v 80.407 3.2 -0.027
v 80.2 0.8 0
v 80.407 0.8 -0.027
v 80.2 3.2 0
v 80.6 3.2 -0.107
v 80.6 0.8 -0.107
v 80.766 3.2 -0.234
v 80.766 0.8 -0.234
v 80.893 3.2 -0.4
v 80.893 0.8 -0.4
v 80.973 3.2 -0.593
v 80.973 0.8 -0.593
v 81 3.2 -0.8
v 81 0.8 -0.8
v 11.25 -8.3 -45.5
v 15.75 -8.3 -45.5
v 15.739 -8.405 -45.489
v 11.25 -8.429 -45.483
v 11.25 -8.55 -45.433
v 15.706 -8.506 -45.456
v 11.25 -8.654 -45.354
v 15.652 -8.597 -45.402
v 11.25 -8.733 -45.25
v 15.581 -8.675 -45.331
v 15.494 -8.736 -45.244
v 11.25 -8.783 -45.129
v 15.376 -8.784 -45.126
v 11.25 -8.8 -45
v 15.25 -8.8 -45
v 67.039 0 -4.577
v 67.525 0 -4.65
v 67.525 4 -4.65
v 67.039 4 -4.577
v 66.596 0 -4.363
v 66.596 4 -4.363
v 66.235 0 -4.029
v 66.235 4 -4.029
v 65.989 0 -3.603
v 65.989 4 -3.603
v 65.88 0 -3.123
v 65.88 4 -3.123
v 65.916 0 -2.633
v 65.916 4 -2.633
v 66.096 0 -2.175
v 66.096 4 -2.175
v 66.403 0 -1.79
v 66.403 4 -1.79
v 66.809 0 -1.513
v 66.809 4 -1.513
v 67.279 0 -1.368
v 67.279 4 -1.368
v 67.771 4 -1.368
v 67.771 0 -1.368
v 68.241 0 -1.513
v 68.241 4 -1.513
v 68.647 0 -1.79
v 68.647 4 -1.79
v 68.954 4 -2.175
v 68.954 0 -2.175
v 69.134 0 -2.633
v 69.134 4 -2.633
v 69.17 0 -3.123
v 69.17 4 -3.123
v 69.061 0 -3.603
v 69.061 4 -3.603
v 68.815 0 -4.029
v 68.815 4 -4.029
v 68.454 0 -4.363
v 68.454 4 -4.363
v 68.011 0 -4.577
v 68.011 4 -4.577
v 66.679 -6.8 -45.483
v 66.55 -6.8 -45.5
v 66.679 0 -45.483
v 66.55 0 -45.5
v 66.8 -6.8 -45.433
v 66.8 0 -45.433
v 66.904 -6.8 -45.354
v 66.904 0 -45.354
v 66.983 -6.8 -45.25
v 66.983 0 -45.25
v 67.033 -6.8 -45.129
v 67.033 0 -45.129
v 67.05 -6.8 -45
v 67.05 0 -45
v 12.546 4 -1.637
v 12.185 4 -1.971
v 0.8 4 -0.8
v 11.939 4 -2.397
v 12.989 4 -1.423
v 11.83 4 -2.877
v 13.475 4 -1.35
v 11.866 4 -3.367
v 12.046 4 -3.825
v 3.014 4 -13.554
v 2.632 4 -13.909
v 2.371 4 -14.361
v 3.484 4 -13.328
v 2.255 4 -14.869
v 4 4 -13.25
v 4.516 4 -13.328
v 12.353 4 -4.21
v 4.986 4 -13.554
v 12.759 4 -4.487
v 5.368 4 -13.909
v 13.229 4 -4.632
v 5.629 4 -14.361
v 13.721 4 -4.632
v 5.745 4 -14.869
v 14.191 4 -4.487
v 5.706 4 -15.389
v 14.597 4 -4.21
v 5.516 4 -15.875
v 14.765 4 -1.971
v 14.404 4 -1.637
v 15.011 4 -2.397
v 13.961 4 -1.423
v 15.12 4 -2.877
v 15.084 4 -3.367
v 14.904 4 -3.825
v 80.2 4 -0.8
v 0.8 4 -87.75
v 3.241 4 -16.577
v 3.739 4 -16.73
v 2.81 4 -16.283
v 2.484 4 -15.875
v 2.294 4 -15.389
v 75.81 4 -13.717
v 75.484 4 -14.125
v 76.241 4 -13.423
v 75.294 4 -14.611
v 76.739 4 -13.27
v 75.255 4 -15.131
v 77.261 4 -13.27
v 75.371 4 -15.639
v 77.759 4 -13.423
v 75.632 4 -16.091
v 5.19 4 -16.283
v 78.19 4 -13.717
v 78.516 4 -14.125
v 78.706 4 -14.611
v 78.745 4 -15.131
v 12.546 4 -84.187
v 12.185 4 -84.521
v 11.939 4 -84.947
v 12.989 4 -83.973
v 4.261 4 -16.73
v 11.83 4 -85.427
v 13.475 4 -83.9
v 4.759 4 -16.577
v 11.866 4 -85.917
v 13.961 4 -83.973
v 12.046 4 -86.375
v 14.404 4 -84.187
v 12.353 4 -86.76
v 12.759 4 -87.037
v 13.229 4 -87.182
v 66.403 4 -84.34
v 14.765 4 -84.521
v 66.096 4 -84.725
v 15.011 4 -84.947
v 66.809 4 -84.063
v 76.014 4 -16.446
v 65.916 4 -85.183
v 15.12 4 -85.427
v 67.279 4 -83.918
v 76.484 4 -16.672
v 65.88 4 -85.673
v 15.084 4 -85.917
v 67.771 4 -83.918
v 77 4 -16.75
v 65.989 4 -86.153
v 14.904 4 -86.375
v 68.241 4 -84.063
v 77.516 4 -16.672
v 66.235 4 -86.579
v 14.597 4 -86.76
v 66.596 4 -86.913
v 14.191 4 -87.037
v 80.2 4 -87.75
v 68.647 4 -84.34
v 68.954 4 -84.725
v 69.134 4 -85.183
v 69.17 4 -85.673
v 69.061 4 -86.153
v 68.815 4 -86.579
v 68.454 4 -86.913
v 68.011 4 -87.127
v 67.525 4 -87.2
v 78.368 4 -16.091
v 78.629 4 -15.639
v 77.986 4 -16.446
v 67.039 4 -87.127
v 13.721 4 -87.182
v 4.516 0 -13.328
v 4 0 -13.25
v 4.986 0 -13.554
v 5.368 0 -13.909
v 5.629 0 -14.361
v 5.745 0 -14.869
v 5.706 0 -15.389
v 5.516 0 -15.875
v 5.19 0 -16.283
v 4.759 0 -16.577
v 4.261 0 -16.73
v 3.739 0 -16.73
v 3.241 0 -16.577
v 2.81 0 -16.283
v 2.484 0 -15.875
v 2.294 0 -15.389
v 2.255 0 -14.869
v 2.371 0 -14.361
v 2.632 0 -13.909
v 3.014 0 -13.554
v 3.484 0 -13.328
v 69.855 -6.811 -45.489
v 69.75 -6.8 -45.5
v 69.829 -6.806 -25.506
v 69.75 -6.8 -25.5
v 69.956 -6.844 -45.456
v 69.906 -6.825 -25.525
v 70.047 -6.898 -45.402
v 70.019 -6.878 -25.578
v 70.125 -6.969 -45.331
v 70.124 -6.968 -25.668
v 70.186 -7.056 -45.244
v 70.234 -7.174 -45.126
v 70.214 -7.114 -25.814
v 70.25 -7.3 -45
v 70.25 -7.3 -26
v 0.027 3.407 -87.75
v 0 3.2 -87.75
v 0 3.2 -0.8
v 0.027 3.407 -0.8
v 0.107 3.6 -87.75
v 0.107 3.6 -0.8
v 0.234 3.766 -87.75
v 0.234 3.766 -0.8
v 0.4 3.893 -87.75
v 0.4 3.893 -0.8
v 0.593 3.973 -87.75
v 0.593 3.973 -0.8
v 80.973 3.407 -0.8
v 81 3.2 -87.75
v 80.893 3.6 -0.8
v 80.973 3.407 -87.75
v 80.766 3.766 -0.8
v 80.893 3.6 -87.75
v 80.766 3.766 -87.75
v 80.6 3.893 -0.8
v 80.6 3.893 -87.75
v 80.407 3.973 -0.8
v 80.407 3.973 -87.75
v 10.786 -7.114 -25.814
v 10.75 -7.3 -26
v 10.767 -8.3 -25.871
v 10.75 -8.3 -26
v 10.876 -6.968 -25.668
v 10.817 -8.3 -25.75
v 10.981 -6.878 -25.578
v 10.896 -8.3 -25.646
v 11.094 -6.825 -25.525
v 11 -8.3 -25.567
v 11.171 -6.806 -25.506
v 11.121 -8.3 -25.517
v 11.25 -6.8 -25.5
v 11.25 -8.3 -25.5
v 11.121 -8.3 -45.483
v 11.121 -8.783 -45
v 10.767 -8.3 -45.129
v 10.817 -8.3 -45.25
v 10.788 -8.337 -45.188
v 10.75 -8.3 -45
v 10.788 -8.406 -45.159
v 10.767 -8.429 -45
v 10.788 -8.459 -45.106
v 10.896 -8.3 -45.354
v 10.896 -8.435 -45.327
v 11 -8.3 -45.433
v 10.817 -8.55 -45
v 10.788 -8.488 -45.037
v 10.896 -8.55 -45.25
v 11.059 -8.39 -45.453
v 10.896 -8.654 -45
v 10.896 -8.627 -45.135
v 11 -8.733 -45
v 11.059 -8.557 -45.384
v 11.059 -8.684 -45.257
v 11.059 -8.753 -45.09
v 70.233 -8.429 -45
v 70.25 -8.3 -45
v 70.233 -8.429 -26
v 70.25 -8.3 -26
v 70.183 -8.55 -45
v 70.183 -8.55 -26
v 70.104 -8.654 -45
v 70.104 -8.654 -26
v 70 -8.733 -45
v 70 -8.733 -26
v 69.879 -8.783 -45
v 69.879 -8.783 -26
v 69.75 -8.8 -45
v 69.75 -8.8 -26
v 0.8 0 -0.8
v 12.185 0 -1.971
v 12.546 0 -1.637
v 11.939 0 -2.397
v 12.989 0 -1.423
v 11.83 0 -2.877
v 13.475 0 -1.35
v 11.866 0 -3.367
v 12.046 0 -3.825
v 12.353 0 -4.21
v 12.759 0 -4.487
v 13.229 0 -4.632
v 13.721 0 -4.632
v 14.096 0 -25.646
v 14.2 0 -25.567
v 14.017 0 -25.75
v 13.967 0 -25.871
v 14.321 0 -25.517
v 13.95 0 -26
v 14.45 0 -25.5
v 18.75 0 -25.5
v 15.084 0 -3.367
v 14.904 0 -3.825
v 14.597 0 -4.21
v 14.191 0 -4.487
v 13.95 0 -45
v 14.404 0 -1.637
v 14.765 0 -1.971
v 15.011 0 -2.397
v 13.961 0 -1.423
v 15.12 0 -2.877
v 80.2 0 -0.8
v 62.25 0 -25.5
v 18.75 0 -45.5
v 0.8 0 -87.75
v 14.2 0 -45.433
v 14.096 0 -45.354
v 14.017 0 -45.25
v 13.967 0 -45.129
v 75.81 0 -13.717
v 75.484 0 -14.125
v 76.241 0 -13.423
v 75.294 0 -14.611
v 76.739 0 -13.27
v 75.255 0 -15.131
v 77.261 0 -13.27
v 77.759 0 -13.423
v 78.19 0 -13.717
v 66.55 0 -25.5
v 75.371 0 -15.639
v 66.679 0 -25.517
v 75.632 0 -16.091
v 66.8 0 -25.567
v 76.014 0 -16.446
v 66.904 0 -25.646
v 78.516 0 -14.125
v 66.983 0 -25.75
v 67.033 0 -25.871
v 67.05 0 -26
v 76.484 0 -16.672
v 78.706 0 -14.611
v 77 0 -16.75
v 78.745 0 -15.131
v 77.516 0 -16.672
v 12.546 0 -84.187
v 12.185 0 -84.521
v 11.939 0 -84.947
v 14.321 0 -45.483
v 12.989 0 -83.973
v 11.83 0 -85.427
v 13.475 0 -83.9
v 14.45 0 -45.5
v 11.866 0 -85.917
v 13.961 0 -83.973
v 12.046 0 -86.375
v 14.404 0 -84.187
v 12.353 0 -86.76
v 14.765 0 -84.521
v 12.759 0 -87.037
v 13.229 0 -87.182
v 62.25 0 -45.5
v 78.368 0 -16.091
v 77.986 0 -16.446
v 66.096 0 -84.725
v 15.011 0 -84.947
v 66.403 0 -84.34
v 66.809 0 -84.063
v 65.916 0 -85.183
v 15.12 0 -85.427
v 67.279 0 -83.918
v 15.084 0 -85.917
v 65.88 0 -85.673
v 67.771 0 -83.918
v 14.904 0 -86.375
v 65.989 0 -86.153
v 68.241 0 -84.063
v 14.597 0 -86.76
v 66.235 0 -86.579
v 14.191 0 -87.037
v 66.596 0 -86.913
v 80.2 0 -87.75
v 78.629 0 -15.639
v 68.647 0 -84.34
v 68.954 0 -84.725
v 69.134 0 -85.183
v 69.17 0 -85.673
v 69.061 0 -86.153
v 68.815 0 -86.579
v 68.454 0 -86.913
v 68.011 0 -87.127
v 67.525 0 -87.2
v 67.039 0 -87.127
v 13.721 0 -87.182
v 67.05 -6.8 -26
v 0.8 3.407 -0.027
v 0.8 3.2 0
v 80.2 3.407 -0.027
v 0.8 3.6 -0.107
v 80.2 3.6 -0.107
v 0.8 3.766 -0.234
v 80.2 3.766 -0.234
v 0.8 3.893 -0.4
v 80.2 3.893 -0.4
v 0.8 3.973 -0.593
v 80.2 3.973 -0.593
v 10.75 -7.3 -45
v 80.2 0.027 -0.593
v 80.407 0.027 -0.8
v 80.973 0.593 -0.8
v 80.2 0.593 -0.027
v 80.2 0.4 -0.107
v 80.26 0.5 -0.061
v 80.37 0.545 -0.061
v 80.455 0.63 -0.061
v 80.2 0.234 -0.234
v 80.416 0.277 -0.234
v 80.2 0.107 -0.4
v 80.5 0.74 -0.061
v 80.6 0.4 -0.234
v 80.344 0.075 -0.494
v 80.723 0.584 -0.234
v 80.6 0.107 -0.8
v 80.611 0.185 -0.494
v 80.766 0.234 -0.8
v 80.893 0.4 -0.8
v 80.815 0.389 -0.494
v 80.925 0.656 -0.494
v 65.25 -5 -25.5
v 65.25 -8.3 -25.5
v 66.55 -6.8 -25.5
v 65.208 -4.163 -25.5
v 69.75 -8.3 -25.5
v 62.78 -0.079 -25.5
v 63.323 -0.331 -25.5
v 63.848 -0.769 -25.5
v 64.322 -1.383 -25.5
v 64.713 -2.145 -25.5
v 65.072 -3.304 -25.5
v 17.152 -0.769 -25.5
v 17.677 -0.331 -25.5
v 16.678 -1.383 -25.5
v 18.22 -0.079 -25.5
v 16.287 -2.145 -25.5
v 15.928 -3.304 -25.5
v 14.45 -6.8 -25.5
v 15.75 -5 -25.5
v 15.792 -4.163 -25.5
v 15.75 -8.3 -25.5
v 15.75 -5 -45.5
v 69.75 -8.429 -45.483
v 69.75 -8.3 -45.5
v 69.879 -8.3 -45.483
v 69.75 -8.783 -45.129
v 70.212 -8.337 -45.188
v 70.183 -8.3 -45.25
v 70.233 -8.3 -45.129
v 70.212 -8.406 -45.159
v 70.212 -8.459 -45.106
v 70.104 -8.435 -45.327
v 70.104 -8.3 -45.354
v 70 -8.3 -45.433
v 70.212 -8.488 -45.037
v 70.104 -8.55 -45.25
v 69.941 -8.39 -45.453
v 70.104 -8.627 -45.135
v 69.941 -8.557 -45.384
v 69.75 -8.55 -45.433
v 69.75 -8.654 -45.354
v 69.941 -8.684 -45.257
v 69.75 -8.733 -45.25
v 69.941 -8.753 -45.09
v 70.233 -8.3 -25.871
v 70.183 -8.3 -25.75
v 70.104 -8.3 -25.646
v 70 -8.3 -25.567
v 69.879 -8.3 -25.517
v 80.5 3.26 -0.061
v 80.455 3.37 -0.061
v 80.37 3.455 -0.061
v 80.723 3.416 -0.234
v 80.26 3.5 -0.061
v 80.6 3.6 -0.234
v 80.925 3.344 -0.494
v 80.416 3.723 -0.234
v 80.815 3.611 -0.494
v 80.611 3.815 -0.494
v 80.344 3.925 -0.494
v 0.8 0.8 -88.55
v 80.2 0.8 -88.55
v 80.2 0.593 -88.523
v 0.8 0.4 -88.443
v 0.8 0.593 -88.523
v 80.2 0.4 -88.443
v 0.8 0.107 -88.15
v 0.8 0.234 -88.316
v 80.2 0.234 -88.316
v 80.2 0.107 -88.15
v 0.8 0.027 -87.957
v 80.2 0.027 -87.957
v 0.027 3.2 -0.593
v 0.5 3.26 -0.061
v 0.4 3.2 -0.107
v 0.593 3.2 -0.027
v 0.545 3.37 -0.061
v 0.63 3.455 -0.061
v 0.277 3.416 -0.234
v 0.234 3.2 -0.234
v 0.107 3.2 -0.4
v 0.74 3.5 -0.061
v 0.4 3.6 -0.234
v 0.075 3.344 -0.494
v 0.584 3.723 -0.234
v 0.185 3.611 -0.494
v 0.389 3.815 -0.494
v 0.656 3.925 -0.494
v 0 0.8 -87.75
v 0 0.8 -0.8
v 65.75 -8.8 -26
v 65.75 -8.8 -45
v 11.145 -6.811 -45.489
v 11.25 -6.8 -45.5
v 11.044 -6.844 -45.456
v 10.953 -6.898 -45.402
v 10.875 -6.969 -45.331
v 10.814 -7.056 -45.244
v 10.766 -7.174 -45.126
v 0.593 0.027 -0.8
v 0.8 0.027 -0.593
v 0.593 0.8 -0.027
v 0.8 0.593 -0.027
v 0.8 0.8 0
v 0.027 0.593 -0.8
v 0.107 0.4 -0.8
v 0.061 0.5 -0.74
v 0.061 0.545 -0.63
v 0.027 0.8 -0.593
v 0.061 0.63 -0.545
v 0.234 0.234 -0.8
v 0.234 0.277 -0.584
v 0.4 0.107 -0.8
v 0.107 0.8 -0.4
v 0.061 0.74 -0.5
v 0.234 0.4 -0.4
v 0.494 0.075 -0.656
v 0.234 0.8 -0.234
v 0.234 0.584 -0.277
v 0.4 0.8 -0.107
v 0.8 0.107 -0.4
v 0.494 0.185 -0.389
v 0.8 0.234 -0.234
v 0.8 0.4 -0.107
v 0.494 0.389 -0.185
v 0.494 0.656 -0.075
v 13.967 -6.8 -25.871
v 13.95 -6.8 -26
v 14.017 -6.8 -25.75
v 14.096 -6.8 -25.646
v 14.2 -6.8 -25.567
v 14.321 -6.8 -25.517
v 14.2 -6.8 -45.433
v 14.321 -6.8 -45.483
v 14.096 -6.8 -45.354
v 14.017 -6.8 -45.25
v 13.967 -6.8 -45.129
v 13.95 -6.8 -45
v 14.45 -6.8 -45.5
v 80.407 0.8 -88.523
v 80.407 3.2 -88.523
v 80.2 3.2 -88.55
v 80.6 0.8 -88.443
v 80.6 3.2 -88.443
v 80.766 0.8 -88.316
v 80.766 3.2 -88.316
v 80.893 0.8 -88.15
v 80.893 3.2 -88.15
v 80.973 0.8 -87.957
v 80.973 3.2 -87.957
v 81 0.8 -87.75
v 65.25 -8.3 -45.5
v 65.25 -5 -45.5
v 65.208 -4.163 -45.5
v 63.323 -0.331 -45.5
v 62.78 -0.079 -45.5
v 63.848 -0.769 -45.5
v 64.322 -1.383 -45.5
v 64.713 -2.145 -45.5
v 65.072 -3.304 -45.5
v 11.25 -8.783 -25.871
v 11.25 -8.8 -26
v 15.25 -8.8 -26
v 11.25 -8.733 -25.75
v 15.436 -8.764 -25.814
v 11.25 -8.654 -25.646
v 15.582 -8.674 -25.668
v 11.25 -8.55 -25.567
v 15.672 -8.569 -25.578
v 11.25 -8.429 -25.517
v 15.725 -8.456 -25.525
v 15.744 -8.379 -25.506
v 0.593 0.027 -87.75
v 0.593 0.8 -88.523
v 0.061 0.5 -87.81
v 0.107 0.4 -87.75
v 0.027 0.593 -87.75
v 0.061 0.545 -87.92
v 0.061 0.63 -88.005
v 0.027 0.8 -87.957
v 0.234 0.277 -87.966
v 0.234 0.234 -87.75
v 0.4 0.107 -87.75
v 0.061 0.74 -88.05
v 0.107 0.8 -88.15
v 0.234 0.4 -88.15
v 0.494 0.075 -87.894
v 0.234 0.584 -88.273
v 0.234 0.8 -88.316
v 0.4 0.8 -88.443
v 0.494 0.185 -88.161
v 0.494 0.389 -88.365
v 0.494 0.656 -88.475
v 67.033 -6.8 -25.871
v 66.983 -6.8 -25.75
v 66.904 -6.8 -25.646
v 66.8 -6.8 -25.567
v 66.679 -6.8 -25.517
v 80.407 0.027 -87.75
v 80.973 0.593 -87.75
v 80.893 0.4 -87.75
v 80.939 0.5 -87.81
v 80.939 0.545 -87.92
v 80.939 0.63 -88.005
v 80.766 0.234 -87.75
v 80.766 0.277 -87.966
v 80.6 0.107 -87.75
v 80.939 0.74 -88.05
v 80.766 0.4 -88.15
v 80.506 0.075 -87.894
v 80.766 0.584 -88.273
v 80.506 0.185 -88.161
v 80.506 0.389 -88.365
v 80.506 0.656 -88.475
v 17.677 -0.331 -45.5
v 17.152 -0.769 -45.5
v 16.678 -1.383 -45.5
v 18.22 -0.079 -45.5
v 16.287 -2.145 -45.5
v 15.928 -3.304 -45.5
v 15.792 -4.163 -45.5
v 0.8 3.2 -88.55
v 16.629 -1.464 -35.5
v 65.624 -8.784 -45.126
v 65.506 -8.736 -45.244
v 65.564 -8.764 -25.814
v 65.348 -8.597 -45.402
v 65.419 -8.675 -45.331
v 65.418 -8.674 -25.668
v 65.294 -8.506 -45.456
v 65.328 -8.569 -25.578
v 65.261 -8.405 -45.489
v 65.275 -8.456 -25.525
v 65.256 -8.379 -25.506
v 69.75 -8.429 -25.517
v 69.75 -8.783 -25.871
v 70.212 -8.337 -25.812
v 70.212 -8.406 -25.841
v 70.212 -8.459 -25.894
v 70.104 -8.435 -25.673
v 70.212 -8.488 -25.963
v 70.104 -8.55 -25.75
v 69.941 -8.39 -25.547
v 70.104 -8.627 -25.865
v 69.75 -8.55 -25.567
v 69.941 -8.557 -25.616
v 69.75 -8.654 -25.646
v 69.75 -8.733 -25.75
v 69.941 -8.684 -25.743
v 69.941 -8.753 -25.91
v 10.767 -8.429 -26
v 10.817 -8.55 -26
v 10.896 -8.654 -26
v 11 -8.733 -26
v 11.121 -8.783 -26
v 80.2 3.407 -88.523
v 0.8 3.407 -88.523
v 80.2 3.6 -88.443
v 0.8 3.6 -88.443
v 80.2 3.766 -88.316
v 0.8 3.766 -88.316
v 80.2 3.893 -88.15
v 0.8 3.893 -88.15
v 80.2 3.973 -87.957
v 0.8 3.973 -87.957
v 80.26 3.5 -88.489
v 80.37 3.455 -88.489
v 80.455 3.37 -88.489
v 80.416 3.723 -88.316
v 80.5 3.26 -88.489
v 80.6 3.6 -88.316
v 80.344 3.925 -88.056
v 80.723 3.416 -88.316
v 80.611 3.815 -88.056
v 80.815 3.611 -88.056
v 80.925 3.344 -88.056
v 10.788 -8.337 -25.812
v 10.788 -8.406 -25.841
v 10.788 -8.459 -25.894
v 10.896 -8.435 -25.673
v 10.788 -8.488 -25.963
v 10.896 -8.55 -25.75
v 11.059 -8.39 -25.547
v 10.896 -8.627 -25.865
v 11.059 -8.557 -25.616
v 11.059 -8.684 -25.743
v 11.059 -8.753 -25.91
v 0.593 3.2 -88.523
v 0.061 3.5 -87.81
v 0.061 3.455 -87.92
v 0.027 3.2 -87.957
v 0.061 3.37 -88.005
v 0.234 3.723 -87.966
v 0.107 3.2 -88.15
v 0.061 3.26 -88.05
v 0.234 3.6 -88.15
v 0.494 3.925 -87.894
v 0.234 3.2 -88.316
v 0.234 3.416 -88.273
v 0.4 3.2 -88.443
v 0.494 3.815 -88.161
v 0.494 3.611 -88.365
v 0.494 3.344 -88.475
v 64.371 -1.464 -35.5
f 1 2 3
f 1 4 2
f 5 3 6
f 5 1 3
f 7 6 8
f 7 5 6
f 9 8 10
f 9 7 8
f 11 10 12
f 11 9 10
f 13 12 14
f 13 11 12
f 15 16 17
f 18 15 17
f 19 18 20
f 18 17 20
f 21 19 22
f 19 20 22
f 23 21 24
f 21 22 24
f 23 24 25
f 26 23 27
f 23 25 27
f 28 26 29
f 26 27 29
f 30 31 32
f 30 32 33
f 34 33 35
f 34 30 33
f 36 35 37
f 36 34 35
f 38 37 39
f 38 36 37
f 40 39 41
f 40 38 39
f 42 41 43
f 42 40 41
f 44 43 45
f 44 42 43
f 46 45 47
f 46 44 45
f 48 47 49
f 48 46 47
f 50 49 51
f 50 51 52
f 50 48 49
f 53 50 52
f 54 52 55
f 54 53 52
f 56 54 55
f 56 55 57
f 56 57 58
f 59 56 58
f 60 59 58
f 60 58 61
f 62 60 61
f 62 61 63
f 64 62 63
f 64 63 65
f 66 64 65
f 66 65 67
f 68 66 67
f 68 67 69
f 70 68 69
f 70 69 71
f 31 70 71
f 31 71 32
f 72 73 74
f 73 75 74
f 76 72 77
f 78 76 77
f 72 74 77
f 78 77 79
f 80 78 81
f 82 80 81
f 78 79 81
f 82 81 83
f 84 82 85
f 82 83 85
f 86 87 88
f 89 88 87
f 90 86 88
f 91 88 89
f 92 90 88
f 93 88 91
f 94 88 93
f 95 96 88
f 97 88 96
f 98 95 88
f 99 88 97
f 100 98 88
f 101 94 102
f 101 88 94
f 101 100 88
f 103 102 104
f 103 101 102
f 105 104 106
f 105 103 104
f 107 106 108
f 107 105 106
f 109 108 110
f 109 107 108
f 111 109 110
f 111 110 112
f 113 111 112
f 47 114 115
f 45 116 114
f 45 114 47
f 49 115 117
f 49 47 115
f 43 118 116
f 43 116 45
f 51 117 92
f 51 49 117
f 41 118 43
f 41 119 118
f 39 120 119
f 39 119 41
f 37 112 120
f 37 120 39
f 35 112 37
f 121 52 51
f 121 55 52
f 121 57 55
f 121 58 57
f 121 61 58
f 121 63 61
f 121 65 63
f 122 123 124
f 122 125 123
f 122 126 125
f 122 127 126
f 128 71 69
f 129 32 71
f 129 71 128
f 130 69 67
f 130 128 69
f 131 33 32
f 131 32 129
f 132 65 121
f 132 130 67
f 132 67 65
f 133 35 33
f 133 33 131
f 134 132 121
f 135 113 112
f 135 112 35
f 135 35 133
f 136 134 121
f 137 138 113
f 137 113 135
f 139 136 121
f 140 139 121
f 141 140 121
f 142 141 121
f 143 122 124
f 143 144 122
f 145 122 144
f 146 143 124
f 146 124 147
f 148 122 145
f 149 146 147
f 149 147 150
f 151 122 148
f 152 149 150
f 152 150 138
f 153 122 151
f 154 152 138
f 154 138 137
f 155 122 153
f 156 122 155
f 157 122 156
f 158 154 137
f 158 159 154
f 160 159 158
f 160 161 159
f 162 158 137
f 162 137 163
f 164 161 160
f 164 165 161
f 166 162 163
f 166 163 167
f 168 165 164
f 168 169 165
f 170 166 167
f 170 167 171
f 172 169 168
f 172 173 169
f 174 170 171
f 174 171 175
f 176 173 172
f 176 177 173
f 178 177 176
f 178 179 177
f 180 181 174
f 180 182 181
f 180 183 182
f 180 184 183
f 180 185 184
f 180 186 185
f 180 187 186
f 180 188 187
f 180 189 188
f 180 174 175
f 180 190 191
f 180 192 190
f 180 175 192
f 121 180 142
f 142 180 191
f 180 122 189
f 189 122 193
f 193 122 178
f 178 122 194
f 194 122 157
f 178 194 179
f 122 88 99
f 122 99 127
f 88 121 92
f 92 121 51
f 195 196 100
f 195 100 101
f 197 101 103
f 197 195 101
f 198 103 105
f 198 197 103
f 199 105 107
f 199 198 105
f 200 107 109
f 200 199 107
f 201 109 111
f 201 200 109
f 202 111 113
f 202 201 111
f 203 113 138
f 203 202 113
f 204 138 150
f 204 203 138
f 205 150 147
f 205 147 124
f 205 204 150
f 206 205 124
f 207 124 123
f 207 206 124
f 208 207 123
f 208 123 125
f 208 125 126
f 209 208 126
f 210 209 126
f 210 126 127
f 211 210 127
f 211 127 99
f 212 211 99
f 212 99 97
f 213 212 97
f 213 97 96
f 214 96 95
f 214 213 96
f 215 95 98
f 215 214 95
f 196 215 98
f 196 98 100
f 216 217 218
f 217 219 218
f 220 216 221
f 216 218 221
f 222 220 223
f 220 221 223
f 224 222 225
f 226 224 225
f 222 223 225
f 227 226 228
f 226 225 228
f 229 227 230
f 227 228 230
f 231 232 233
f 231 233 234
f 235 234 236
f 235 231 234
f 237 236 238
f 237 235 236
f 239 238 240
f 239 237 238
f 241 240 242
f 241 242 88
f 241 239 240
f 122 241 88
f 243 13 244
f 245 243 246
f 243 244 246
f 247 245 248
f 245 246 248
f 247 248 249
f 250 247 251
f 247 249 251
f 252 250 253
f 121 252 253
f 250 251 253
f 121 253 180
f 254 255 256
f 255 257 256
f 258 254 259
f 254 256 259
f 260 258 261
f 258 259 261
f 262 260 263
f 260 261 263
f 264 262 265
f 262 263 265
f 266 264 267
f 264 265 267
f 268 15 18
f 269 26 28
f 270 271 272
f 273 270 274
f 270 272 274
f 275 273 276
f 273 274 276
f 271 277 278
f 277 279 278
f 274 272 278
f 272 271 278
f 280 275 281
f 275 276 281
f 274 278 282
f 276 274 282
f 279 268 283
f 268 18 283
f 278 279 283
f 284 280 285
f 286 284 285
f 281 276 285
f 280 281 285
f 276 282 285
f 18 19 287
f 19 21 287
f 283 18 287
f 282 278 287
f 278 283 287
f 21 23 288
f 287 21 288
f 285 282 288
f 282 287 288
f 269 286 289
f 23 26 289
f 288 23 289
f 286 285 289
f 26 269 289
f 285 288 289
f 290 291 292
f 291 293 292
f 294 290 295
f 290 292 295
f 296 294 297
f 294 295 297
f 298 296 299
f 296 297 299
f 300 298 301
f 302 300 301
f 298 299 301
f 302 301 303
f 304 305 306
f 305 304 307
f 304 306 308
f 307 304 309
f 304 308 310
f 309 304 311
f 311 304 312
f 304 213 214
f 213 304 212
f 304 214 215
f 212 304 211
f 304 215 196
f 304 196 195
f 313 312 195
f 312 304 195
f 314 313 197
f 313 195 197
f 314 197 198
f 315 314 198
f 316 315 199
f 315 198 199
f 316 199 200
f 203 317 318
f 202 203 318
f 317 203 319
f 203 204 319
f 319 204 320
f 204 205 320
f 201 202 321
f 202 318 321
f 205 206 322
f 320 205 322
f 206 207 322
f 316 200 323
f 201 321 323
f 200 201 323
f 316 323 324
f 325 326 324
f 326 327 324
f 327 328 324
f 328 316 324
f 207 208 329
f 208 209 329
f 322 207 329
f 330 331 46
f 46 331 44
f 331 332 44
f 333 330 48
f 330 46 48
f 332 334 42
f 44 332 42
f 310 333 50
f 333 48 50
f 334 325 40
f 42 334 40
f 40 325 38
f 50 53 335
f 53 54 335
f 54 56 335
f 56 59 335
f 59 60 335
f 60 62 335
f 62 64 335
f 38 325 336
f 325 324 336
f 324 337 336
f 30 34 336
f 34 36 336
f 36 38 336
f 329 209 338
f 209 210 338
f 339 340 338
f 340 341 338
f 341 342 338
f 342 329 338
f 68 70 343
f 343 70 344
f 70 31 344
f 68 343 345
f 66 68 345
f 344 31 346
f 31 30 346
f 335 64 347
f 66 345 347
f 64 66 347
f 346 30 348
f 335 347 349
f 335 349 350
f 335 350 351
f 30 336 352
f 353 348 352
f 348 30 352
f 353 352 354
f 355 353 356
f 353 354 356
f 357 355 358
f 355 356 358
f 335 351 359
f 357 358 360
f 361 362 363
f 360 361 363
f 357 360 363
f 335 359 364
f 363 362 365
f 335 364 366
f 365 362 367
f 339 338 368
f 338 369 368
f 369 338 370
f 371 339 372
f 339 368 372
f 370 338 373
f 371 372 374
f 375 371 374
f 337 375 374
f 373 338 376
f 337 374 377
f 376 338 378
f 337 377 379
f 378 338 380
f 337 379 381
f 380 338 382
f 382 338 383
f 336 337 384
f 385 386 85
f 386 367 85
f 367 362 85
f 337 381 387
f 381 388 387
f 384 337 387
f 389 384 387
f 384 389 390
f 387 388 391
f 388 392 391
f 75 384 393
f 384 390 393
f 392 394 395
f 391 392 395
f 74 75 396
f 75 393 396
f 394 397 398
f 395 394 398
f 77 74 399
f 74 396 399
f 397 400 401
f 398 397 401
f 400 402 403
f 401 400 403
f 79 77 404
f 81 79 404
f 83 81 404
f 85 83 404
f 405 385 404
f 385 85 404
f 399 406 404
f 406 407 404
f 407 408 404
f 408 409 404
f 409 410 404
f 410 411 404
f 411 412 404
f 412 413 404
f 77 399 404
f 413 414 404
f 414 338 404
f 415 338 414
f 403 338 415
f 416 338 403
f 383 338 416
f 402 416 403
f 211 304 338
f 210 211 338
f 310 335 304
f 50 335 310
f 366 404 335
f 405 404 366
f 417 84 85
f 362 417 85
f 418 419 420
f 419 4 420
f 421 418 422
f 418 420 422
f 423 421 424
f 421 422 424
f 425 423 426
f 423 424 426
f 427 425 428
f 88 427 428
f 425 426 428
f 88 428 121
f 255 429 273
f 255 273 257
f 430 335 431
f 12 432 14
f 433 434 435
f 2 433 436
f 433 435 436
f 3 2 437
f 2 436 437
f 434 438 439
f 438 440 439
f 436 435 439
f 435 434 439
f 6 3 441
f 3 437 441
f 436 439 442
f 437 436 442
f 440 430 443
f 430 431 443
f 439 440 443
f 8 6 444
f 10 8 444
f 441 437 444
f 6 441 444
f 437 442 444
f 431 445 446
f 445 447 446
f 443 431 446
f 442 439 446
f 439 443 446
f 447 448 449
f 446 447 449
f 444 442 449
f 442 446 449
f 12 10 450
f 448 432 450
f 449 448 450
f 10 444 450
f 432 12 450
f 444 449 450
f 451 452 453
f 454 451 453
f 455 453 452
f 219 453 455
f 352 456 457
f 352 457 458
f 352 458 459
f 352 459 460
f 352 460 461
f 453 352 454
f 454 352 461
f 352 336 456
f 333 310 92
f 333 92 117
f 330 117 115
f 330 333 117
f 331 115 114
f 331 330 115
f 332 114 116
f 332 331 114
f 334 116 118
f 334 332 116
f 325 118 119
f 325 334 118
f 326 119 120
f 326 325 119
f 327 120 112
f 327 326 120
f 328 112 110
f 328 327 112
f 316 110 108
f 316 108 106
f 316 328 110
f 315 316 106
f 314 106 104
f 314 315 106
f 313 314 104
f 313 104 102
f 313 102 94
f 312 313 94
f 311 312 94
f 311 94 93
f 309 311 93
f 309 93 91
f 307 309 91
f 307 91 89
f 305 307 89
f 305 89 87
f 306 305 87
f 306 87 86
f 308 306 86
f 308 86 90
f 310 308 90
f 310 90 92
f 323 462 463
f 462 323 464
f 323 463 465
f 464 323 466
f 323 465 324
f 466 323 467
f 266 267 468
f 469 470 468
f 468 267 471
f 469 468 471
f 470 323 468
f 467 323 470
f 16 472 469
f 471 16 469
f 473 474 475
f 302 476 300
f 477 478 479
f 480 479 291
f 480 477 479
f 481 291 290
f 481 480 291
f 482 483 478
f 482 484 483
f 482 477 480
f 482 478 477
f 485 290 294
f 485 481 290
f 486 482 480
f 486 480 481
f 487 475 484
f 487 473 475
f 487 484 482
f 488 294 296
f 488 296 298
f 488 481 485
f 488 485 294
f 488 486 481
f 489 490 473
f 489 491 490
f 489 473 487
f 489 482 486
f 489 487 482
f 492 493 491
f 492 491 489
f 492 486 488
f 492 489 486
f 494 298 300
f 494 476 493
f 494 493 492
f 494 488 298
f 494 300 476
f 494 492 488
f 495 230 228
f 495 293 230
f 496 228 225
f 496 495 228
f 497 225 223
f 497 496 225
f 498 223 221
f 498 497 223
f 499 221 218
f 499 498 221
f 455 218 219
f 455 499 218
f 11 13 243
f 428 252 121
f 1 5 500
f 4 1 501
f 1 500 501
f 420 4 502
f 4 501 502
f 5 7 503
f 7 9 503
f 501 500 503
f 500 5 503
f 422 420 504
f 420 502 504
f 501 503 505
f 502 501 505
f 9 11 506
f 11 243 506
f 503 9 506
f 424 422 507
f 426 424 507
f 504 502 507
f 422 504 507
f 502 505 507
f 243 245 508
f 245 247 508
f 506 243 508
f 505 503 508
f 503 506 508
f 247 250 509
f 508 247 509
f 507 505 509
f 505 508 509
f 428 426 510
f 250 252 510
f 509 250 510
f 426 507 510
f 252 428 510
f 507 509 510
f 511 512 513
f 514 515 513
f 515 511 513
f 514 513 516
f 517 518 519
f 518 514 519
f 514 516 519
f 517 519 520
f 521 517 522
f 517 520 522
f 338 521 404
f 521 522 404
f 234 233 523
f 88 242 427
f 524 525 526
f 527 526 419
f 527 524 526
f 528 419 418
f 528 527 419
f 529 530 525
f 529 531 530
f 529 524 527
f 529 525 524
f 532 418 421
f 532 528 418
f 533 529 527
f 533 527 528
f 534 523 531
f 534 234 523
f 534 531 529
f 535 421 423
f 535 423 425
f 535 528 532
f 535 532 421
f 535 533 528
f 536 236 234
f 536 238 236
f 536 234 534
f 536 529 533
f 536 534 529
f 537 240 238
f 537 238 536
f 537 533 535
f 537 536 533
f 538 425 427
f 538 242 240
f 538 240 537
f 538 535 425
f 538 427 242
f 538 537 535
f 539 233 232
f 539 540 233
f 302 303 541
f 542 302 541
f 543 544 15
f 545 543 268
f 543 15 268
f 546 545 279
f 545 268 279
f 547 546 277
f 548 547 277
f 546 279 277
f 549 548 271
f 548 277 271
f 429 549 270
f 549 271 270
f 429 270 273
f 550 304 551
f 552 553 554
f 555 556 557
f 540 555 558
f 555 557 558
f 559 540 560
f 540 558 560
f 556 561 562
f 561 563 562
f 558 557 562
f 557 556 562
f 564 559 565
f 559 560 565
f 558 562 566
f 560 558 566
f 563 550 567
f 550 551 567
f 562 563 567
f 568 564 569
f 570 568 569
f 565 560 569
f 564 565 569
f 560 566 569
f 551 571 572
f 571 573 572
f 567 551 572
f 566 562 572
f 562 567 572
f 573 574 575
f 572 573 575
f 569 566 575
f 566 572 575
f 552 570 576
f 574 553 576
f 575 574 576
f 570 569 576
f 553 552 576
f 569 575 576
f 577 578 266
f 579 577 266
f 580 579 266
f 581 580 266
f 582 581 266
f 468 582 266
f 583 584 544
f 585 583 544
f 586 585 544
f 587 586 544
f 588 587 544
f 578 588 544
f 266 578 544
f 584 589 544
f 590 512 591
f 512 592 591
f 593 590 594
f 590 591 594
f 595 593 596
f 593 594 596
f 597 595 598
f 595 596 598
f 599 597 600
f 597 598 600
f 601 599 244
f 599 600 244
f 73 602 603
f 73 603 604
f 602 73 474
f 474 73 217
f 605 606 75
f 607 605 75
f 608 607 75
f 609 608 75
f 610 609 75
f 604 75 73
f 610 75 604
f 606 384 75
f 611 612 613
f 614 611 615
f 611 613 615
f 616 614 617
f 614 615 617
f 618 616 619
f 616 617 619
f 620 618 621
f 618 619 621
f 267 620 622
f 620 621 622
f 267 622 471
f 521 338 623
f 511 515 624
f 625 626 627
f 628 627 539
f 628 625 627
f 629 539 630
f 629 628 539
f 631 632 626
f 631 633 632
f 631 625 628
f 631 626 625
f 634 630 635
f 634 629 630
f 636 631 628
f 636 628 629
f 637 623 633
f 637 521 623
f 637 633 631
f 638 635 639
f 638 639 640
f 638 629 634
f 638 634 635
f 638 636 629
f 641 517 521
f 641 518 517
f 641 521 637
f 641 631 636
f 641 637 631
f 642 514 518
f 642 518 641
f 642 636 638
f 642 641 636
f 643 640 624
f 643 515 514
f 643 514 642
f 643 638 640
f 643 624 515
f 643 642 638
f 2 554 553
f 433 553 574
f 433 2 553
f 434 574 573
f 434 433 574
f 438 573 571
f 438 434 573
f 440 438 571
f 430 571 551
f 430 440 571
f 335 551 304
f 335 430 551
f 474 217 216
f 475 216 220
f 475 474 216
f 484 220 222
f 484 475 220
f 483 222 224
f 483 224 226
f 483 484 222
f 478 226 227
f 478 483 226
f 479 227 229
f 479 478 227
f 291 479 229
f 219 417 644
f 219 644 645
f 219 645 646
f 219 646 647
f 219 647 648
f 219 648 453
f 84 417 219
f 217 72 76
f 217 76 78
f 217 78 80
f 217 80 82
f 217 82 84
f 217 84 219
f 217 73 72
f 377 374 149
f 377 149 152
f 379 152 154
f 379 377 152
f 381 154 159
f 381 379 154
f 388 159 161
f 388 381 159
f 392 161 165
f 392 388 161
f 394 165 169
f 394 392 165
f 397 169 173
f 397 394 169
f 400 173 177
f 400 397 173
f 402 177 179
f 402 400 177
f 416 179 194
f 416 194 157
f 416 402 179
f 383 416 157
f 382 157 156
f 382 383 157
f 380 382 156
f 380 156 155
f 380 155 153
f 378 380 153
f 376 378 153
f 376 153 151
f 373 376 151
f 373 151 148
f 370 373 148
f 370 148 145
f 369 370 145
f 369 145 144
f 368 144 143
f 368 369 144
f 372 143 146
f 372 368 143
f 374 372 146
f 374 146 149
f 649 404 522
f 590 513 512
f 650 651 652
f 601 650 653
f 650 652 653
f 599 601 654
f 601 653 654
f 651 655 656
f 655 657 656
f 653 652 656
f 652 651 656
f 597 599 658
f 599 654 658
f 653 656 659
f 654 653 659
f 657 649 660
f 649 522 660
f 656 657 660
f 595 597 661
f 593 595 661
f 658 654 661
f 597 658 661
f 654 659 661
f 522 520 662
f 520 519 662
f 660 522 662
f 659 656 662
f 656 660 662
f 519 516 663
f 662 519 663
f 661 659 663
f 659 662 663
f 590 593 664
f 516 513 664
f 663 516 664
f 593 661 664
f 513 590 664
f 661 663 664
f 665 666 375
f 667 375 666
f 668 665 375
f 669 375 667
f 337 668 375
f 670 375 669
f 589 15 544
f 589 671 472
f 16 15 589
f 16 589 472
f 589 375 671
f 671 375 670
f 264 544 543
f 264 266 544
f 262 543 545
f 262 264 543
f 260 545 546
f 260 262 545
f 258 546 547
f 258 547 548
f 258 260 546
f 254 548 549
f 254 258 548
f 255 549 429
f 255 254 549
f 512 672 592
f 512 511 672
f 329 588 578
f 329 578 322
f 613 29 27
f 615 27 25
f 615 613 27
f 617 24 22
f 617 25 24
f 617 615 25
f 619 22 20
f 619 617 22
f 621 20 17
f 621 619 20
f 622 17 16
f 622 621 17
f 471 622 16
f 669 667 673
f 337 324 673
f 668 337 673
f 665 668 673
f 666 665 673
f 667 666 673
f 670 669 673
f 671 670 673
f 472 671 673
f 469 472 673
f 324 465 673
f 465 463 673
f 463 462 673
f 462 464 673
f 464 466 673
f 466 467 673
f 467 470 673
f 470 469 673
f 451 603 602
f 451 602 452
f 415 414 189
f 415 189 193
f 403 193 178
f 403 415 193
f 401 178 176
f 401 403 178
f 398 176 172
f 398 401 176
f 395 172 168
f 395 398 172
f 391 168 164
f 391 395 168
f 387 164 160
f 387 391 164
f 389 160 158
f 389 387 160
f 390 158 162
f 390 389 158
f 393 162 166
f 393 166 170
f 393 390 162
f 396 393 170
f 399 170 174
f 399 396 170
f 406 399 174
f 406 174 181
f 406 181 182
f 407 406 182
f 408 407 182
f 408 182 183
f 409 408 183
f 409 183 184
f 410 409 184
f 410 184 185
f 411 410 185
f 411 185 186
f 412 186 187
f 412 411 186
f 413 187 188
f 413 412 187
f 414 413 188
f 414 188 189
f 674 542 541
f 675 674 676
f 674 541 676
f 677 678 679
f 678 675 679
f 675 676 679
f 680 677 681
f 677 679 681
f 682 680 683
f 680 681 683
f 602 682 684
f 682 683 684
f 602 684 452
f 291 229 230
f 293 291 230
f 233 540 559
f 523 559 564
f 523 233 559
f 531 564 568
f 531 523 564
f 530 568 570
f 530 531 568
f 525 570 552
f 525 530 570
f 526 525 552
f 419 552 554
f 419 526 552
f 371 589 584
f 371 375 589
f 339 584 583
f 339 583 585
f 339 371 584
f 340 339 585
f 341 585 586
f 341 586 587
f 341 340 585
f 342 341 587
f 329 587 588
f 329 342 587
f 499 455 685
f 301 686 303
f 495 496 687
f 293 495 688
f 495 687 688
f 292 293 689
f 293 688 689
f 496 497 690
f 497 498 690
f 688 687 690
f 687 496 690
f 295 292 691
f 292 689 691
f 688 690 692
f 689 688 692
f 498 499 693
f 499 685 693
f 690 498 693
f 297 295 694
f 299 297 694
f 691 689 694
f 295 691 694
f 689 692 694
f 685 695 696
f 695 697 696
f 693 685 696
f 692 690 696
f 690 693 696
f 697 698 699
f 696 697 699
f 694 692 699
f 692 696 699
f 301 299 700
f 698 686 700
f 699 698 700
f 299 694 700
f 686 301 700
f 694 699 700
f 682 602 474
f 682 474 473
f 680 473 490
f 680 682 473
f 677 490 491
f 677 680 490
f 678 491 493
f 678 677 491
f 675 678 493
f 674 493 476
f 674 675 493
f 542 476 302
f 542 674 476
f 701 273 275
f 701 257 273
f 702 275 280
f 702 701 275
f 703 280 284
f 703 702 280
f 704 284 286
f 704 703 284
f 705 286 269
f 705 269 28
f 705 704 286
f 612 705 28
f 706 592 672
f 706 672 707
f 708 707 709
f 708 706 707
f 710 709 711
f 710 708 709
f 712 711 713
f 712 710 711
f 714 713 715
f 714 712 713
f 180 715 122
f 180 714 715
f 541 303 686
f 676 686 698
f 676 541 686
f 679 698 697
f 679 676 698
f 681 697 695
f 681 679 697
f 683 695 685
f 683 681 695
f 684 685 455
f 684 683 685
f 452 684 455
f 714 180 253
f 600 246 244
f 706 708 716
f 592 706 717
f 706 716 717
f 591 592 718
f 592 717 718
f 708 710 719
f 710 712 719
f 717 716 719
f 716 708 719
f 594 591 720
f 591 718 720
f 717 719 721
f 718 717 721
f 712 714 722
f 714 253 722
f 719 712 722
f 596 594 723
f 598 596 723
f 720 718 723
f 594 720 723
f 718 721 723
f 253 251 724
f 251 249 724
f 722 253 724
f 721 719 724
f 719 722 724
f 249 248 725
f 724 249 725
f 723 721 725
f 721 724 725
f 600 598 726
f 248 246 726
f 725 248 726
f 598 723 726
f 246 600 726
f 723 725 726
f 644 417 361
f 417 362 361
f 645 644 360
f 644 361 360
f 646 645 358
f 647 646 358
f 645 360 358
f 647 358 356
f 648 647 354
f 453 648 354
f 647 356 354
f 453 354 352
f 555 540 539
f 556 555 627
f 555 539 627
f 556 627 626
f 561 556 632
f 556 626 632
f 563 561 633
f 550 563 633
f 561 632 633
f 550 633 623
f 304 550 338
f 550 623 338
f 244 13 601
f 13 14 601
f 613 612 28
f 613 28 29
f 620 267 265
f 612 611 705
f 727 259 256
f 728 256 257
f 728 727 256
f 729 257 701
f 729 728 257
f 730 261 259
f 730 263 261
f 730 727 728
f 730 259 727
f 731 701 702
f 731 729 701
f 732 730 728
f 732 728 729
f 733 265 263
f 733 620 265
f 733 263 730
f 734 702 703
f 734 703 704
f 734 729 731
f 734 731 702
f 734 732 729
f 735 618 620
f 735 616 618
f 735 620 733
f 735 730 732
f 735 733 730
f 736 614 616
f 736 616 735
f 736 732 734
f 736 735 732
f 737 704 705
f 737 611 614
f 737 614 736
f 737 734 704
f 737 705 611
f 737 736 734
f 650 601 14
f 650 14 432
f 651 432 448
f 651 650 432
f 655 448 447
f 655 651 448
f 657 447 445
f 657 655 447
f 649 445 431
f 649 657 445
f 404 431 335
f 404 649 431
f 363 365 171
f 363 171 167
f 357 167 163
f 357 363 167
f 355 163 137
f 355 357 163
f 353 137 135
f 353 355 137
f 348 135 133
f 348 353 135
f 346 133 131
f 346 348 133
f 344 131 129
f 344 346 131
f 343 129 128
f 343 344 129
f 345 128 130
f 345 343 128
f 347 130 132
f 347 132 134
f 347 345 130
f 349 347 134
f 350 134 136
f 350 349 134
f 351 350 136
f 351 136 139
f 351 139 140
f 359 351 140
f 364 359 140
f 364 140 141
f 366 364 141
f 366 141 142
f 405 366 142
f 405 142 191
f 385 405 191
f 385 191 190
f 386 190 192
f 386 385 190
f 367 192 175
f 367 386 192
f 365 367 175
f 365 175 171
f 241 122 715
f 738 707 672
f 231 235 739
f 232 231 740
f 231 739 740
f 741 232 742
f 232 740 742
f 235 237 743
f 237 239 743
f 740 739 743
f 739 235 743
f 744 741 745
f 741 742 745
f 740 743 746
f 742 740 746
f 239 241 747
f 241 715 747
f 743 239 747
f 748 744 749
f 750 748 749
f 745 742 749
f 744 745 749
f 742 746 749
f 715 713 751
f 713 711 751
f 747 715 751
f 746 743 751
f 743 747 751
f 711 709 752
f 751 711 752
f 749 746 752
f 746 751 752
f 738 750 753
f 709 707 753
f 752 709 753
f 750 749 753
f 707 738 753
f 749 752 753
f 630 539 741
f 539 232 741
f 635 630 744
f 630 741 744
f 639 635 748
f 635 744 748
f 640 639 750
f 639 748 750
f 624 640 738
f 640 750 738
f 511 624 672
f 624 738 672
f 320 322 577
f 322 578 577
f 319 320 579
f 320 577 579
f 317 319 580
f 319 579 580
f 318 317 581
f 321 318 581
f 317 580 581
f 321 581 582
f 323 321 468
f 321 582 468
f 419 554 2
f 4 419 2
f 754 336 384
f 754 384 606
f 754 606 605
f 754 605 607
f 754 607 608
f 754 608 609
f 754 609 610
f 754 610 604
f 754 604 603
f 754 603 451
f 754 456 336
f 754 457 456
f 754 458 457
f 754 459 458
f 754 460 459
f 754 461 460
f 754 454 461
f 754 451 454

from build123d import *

# Parameters (mm, degrees)
SKETCH1_W                 = 81
SKETCH1_H                 = 88.55
SKETCH1_R                 = 1.75
SKETCH1_R_2               = 1.65
BOSS_EXTRUDE1_DEPTH       = 4
FILLET3_R                 = 0.8
SKETCH2_W                 = 5
SKETCH2_H                 = 20
BOSS_EXTRUDE2_DEPTH       = 8.8
SKETCH5_W                 = 3.2
SKETCH5_H                 = 6.8
CUT_EXTRUDE1_DEPTH        = 94.320362194
FILLET1_SIZE              = 3
FILLET1_SIZE_2            = 5
FILLET2_R                 = 0.5
FILLET1_OF_MIRROR1_SIZE   = 3
FILLET1_OF_MIRROR1_SIZE_2 = 5
FILLET2_OF_MIRROR1_R      = 0.5


with BuildPart() as part:
    # Sketch1 → Boss-Extrude1 (new body)
    with BuildSketch(Plane(origin=(0, 0, 0), x_dir=(1, 0, 0), z_dir=(0, 1, 0))):
        with Locations((40.5, 44.275)):
            Rectangle(SKETCH1_W, SKETCH1_H)
        with Locations(Location((4, 15, 0), (0, 0, 270))):
            Circle(SKETCH1_R, mode=Mode.SUBTRACT)
        with Locations(Location((13.475, 3, 0), (0, 0, 270))):
            Circle(SKETCH1_R_2, mode=Mode.SUBTRACT)
        with Locations(Location((13.475, 85.55, 0), (0, 0, 270))):
            Circle(SKETCH1_R_2, mode=Mode.SUBTRACT)
        with Locations(Location((77, 15, 0), (0, 0, 90))):
            Circle(SKETCH1_R, mode=Mode.SUBTRACT)
        with Locations(Location((67.525, 3, 0), (0, 0, 90))):
            Circle(SKETCH1_R_2, mode=Mode.SUBTRACT)
        with Locations(Location((67.525, 85.55, 0), (0, 0, 90))):
            Circle(SKETCH1_R_2, mode=Mode.SUBTRACT)
    extrude(amount=BOSS_EXTRUDE1_DEPTH)

    # Fillet3
    fillet3_edges = [part.edges().sort_by_distance(p)[0] for p in [
        (81, 4, -44.275),
        (40.5, 4, -88.55),
        (0, 4, -44.275),
        (40.5, 0, -88.55),
        (81, 0, -44.275),
        (40.5, 0, 0),
        (0, 0, -44.275),
        (0, 2, -88.55),
        (81, 2, -88.55),
        (81, 2, 0),
        (0, 2, 0),
        (40.5, 4, 0),
    ]]
    fillet(fillet3_edges, radius=FILLET3_R)

    # Sketch2 → Boss-Extrude2 (add)
    with BuildSketch(Plane.XZ):
        with Locations((13.25, -35.5)):
            Rectangle(SKETCH2_W, SKETCH2_H)
    boss_extrude2 = extrude(amount=BOSS_EXTRUDE2_DEPTH)

    # Sketch5 → Cut-Extrude1 (cut, through all)
    with BuildSketch(Plane(origin=(0, 0, -45.5), x_dir=(-1, 0, 0), z_dir=(0, 0, -1))):
        with Locations((-12.35, -3.4)):
            Rectangle(SKETCH5_W, SKETCH5_H)
    cut_extrude1 = extrude(amount=-CUT_EXTRUDE1_DEPTH, mode=Mode.SUBTRACT)

    # Fillet1
    # an asymmetric fillet: 5, 3 mm, written as the material it adds along each edge
    with BuildSketch(Plane(origin=(15.75, 0, -25.5), x_dir=(1, 0, 0), z_dir=(0, 0, -1))) as fillet1_piece_1:
        with BuildLine():
            Bezier((FILLET1_SIZE, 0), (0, 0), (0, FILLET1_SIZE_2), weights=[1, 0.707106781, 1])
            Line((0, FILLET1_SIZE_2), (0, 0))
            Line((0, 0), (FILLET1_SIZE, 0))
        make_face()
    extrude(amount=20)

    # Fillet2
    fillet2_edges = [part.edges().sort_by_distance(p)[0] for p in [
        (13.25, -8.8, -25.5),
        (13.25, -8.8, -45.5),
        (10.75, -7.8, -25.5),
        (10.75, -7.8, -45.5),
        (10.75, -6.8, -35.5),
        (13.95, -3.4, -45.5),
        (13.95, -3.4, -25.5),
        (10.75, -8.8, -35.5),
        (15.75, -8.8, -35.5),
    ]]
    fillet(fillet2_edges, radius=FILLET2_R)

    # Mirror1: Boss-Extrude2, Cut-Extrude1 across plane
    add(boss_extrude2.mirror(Plane.ZY.offset(-40.5)))
    add(cut_extrude1.mirror(Plane.ZY.offset(-40.5)), mode=Mode.SUBTRACT)

    # Fillet1 of Mirror1
    # an asymmetric fillet: 5, 3 mm, written as the material it adds along each edge
    with BuildSketch(Plane(origin=(65.25, 0, -25.5), x_dir=(-1, 0, 0), z_dir=(0, 0, -1))) as fillet1_of_mirror1_piece_1:
        with BuildLine():
            Bezier((FILLET1_OF_MIRROR1_SIZE, 0), (0, 0), (0, -FILLET1_OF_MIRROR1_SIZE_2), weights=[1, 0.707106781, 1])
            Line((0, -FILLET1_OF_MIRROR1_SIZE_2), (0, 0))
            Line((0, 0), (FILLET1_OF_MIRROR1_SIZE, 0))
        make_face()
    extrude(amount=20)

    # Fillet2 of Mirror1
    fillet2_of_mirror1_edges = [part.edges().sort_by_distance(p)[0] for p in [
        (67.75, -8.8, -25.5),
        (67.75, -8.8, -45.5),
        (70.25, -7.8, -25.5),
        (70.25, -7.8, -45.5),
        (70.25, -6.8, -35.5),
        (67.05, -3.4, -45.5),
        (67.05, -3.4, -25.5),
        (70.25, -8.8, -35.5),
        (65.25, -8.8, -35.5),
    ]]
    fillet(fillet2_of_mirror1_edges, radius=FILLET2_OF_MIRROR1_R)


solid = part.part
